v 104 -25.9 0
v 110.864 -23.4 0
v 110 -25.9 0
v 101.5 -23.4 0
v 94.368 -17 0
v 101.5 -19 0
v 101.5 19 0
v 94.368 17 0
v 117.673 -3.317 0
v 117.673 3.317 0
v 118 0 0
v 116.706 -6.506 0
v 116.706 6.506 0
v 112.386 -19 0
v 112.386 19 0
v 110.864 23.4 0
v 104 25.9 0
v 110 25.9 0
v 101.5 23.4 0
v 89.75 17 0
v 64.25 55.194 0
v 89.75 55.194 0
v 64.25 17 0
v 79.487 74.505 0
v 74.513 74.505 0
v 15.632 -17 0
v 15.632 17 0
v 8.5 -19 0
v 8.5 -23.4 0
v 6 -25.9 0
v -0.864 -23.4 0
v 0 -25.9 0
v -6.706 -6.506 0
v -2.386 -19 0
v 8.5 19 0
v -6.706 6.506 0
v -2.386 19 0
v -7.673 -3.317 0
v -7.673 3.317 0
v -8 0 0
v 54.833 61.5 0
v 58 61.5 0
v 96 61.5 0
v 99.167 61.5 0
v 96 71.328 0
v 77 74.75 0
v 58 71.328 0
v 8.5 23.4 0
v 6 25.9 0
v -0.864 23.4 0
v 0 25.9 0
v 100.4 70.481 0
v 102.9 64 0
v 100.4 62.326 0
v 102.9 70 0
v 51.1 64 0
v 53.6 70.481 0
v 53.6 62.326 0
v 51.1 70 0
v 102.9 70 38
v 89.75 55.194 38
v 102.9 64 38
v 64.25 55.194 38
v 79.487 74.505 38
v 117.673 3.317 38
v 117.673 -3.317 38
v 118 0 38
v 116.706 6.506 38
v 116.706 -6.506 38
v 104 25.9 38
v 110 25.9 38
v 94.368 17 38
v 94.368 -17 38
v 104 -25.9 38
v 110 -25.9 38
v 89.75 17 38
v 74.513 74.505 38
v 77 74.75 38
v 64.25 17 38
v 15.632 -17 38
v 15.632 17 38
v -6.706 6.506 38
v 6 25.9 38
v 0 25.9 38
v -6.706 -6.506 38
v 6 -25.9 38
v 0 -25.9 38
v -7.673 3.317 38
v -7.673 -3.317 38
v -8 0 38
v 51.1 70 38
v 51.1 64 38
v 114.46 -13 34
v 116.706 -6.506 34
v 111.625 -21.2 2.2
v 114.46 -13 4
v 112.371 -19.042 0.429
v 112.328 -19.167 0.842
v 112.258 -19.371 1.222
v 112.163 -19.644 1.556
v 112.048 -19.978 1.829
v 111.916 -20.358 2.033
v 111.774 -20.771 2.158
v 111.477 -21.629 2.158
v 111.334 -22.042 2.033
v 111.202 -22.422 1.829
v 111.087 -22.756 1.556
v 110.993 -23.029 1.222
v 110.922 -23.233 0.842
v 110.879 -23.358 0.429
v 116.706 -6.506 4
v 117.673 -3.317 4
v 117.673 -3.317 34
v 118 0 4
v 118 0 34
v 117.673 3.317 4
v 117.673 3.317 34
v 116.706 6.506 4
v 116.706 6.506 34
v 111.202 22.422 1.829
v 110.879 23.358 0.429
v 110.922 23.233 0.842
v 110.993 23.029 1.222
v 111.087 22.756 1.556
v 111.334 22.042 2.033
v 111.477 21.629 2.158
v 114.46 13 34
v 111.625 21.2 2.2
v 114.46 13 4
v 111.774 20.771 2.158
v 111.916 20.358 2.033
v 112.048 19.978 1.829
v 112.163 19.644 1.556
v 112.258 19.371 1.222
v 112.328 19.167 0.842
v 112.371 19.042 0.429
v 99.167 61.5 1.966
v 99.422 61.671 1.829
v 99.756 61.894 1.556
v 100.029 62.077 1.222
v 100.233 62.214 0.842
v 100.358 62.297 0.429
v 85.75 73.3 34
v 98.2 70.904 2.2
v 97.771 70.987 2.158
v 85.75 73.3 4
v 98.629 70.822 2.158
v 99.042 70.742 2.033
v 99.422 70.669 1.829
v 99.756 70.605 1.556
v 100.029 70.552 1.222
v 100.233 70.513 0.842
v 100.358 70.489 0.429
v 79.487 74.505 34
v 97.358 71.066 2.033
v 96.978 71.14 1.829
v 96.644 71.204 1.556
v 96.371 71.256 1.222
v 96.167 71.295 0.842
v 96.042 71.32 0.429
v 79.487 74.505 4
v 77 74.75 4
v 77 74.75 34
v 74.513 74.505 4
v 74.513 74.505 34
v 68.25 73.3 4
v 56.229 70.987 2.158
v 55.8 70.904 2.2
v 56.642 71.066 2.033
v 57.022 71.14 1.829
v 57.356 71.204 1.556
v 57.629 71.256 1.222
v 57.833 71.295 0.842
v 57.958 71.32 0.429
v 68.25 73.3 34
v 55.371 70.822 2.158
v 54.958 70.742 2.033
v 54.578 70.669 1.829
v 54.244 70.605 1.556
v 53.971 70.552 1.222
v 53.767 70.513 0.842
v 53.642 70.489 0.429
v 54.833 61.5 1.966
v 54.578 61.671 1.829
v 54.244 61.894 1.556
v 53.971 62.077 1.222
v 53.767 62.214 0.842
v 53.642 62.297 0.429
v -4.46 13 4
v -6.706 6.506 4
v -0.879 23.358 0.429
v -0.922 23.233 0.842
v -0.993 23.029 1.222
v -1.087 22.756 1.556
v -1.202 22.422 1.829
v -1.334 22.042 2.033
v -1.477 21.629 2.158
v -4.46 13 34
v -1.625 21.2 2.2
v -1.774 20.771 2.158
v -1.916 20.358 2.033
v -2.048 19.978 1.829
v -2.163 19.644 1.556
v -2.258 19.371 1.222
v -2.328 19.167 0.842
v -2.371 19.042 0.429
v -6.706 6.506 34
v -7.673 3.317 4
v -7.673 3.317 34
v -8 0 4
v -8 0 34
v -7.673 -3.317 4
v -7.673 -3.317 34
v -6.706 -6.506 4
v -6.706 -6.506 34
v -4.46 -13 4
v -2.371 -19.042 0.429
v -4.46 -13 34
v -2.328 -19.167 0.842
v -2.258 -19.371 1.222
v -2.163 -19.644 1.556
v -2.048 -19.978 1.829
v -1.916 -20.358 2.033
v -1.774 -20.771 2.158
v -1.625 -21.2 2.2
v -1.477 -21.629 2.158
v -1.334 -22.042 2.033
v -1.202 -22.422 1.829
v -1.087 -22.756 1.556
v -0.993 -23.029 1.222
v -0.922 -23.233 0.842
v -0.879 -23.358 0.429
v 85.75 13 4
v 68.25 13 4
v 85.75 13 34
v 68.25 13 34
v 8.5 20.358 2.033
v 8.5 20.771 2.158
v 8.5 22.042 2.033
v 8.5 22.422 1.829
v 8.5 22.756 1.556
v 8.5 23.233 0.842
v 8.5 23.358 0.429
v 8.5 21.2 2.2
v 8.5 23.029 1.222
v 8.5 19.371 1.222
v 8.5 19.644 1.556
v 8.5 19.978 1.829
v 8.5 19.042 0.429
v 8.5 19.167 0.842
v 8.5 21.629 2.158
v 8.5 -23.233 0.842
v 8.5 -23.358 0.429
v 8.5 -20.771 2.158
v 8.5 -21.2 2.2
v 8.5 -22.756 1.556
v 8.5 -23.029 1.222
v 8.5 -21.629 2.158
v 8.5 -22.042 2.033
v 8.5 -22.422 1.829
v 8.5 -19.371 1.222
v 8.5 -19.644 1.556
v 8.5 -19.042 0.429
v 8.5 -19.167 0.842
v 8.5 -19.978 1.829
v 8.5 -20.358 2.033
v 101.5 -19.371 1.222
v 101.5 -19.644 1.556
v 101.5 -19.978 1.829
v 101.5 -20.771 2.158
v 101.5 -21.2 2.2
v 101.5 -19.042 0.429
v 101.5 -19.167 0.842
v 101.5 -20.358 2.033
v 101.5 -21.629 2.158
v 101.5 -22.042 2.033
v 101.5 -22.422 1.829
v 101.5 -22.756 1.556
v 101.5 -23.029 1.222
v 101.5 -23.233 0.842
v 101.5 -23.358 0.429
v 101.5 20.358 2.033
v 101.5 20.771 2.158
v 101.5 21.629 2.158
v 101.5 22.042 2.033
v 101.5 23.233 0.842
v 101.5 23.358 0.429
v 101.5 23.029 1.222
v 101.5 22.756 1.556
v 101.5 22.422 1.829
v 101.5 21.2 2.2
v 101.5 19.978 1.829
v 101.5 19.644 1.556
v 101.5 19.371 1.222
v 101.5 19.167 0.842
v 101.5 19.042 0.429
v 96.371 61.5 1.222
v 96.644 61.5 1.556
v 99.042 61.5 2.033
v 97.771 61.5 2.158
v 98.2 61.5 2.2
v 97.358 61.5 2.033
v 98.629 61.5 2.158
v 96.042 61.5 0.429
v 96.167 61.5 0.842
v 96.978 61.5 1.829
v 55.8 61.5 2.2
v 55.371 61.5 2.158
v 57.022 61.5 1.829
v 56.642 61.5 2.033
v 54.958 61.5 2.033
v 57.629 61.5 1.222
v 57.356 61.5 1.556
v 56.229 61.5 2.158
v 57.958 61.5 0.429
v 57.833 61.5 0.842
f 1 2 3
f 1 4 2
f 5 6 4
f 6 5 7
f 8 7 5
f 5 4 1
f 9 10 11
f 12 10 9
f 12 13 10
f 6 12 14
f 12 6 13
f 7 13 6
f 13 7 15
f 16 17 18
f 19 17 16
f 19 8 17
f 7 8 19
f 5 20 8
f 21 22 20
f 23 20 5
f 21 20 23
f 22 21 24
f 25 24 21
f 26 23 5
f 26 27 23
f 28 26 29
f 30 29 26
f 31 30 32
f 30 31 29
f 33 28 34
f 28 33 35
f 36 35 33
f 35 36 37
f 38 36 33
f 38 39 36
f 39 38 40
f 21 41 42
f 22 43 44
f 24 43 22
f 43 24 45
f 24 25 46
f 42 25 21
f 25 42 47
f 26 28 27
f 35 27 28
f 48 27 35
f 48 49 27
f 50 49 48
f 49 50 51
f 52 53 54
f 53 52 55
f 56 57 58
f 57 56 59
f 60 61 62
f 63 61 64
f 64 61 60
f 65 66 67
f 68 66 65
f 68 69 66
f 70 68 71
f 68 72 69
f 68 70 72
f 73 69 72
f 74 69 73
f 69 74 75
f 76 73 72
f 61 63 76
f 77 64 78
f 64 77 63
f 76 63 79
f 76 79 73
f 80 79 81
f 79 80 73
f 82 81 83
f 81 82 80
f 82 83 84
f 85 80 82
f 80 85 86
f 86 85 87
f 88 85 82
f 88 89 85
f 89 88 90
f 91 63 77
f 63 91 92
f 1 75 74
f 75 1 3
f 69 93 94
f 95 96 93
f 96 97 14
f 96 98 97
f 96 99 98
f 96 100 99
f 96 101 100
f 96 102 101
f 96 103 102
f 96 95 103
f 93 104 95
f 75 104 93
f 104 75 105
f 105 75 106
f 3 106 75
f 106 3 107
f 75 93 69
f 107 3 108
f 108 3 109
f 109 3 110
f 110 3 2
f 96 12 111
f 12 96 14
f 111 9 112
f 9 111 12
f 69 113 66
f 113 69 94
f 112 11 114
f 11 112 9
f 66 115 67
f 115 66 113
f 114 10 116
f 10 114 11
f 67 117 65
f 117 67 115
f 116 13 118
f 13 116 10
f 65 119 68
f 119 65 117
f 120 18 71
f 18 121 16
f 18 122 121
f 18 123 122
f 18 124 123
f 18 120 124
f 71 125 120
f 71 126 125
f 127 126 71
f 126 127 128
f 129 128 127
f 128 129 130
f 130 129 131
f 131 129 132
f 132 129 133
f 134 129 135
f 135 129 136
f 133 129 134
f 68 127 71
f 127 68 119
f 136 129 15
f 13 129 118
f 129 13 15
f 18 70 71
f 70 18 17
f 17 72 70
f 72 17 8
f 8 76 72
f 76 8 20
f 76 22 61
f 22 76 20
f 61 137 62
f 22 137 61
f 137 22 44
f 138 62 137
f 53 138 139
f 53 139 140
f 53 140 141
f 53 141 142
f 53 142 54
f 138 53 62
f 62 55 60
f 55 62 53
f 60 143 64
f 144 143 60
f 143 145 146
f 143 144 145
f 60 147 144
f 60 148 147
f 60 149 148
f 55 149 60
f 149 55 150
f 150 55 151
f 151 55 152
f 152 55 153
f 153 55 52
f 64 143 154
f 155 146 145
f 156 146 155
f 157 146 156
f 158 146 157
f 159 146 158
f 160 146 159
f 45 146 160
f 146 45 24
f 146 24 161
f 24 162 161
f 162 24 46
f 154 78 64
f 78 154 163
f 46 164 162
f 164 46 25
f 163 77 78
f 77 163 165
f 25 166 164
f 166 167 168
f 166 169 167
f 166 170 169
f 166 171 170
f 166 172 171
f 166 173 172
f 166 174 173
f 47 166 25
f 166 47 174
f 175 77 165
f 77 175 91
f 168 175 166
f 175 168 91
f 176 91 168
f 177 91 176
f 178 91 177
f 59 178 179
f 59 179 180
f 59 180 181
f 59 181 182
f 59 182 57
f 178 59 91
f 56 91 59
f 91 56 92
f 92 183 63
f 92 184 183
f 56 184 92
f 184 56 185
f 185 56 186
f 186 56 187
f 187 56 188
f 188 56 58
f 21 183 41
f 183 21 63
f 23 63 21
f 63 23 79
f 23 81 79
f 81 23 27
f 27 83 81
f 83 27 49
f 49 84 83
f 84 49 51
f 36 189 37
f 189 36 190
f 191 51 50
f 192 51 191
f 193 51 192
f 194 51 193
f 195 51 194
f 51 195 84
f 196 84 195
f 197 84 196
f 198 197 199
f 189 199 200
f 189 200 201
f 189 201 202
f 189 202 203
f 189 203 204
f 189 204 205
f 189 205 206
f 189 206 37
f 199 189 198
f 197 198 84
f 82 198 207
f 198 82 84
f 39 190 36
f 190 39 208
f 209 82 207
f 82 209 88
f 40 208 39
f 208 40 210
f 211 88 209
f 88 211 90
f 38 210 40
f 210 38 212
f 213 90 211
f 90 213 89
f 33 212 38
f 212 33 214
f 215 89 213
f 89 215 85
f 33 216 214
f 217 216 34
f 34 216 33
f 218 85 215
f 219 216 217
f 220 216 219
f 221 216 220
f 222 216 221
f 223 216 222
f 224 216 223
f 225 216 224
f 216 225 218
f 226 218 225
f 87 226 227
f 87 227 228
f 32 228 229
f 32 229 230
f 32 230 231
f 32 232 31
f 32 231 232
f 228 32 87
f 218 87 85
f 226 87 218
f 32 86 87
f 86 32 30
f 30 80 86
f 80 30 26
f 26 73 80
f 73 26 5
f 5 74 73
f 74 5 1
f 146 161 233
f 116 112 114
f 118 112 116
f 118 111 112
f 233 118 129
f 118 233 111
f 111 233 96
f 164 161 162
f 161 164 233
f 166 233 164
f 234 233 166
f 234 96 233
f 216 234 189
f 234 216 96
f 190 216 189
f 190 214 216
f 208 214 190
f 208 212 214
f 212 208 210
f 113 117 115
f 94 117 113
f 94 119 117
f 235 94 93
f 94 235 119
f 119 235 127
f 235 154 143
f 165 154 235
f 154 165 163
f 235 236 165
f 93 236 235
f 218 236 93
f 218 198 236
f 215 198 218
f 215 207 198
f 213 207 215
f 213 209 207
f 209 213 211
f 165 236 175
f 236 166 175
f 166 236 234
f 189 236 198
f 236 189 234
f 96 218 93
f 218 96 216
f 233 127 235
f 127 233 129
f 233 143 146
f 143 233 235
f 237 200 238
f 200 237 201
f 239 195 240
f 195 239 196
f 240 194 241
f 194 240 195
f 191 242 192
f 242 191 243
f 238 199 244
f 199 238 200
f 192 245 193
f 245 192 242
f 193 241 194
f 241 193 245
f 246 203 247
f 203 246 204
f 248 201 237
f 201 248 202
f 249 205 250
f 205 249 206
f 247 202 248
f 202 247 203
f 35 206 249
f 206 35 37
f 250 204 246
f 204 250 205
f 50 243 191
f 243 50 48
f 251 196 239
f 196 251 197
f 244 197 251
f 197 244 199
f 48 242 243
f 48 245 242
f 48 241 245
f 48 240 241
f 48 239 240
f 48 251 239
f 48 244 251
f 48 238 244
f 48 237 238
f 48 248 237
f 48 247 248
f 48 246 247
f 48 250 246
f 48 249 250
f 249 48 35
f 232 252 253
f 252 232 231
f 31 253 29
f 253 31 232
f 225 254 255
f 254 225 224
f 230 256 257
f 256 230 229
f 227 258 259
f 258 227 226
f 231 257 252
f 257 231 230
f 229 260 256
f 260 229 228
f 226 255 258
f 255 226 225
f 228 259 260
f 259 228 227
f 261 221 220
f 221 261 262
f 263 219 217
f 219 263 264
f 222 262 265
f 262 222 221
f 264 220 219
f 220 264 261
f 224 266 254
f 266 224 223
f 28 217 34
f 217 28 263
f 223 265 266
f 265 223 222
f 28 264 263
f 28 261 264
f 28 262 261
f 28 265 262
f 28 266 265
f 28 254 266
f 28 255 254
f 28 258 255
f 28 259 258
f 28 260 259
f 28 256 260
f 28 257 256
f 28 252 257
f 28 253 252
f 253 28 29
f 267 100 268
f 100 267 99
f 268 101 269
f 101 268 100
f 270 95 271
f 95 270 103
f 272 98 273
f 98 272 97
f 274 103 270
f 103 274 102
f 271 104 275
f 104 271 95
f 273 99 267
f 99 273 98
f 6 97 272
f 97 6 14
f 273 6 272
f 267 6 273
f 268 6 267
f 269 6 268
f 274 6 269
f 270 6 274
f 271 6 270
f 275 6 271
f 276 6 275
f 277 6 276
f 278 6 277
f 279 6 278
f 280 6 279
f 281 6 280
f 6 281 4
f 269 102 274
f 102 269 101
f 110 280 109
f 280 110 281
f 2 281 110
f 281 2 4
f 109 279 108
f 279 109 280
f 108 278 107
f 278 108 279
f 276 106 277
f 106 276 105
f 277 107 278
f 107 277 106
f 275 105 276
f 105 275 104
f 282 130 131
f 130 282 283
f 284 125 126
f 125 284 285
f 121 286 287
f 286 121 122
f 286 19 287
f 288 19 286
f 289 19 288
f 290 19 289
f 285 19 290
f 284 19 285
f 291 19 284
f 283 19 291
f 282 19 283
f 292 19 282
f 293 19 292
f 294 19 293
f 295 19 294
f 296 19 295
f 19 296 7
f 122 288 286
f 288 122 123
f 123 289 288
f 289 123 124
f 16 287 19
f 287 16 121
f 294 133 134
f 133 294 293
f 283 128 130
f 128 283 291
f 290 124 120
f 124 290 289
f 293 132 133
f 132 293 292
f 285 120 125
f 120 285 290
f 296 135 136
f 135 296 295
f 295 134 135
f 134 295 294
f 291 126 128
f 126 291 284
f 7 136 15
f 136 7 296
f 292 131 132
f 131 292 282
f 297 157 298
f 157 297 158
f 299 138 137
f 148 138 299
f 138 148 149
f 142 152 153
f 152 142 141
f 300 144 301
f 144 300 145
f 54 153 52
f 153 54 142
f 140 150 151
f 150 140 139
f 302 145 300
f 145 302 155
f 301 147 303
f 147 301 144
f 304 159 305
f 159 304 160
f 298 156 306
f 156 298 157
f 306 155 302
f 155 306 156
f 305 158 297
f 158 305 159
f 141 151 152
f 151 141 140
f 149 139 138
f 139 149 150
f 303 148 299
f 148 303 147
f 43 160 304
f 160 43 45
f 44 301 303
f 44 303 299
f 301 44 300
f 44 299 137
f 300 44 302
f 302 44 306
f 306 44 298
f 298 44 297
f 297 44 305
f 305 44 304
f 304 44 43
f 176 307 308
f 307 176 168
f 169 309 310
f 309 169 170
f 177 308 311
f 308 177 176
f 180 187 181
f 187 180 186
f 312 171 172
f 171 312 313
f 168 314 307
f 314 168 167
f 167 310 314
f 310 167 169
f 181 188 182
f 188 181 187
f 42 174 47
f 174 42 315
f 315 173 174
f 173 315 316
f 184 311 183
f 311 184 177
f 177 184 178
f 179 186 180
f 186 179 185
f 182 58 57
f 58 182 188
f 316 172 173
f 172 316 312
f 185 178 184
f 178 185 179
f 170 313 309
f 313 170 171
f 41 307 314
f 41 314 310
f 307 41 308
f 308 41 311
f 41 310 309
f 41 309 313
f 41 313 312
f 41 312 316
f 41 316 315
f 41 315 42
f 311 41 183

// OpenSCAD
$fn = 32;

// ----------------------------------------------------------------------
// Air duct: 34 mm duct, 4 mm wall, 38 mm across
// ----------------------------------------------------------------------

// --- parameters (mm) ---
duct_r = 17;              // duct core radius
duct_d = 34;              // duct core diameter
wall = 4;                 // duct wall thickness
height = 38;              // duct width (extrusion height)
port_r = 25.9;            // port flange half width
port_d = 51.8;            // port flange width
port_t = 6;               // port flange thickness
bolt_d = 4.4;             // port bolt holes
bolt_offset = 21.2;       // bolt hole offset from the port axis
branch_r = 12.75;         // branch core radius
branch_d = 25.5;          // branch core diameter
branch_len = 70;          // branch length from the run axis

difference() {
  /* outer hull chain: tube with a flat flange plate at every port */
  linear_extrude(height = 38) {
    hull() {
      polygon([[0, -25.9], [0, 25.9], [6, 25.9], [6, -25.9]]);
      translate([9, 0]) circle(r = 17);
    }
    hull() {
      translate([9, 0]) circle(r = 17);
      translate([33, 0]) circle(r = 17);
    }
    hull() {
      translate([33, 0]) circle(r = 17);
      translate([77, 0]) circle(r = 17);
    }
    hull() {
      translate([77, 0]) circle(r = 17);
      translate([101, 0]) circle(r = 17);
    }
    hull() {
      translate([101, 0]) circle(r = 17);
      polygon([[110, 25.9], [110, -25.9], [104, -25.9], [104, 25.9]]);
    }
    hull() {
      translate([77, 0]) circle(r = 12.75);
      translate([77, 38.5]) circle(r = 12.75);
    }
    hull() {
      translate([77, 38.5]) circle(r = 12.75);
      translate([77, 62]) circle(r = 12.75);
    }
    hull() {
      translate([77, 62]) circle(r = 12.75);
      polygon([[51.1, 70], [102.9, 70], [102.9, 64], [51.1, 64]]);
    }
  }
  /* air passage: the same chain inset by the wall, 5 mm proud of the ports */
  translate([0, 0, 4]) linear_extrude(height = 30) {
    hull() {
      translate([-5, 0]) circle(r = 13);
      translate([33, 0]) circle(r = 13);
    }
    hull() {
      translate([33, 0]) circle(r = 13);
      translate([77, 0]) circle(r = 13);
    }
    hull() {
      translate([77, 0]) circle(r = 13);
      translate([115, 0]) circle(r = 13);
    }
    hull() {
      translate([77, 0]) circle(r = 8.75);
      translate([77, 38.5]) circle(r = 8.75);
    }
    hull() {
      translate([77, 38.5]) circle(r = 8.75);
      translate([77, 75]) circle(r = 8.75);
    }
  }
  translate([0, 0]) rotate([0, 0, -90]) translate([-21.2, -2.5]) rotate([-90, 0, 0]) cylinder(h = 11, d = 4.4);
  translate([0, 0]) rotate([0, 0, -90]) translate([21.2, -2.5]) rotate([-90, 0, 0]) cylinder(h = 11, d = 4.4);
  translate([110, 0]) rotate([0, 0, 90]) translate([-21.2, -2.5]) rotate([-90, 0, 0]) cylinder(h = 11, d = 4.4);
  translate([110, 0]) rotate([0, 0, 90]) translate([21.2, -2.5]) rotate([-90, 0, 0]) cylinder(h = 11, d = 4.4);
  translate([77, 70]) rotate([0, 0, 180]) translate([-21.2, -2.5]) rotate([-90, 0, 0]) cylinder(h = 11, d = 4.4);
  translate([77, 70]) rotate([0, 0, 180]) translate([21.2, -2.5]) rotate([-90, 0, 0]) cylinder(h = 11, d = 4.4);
}
